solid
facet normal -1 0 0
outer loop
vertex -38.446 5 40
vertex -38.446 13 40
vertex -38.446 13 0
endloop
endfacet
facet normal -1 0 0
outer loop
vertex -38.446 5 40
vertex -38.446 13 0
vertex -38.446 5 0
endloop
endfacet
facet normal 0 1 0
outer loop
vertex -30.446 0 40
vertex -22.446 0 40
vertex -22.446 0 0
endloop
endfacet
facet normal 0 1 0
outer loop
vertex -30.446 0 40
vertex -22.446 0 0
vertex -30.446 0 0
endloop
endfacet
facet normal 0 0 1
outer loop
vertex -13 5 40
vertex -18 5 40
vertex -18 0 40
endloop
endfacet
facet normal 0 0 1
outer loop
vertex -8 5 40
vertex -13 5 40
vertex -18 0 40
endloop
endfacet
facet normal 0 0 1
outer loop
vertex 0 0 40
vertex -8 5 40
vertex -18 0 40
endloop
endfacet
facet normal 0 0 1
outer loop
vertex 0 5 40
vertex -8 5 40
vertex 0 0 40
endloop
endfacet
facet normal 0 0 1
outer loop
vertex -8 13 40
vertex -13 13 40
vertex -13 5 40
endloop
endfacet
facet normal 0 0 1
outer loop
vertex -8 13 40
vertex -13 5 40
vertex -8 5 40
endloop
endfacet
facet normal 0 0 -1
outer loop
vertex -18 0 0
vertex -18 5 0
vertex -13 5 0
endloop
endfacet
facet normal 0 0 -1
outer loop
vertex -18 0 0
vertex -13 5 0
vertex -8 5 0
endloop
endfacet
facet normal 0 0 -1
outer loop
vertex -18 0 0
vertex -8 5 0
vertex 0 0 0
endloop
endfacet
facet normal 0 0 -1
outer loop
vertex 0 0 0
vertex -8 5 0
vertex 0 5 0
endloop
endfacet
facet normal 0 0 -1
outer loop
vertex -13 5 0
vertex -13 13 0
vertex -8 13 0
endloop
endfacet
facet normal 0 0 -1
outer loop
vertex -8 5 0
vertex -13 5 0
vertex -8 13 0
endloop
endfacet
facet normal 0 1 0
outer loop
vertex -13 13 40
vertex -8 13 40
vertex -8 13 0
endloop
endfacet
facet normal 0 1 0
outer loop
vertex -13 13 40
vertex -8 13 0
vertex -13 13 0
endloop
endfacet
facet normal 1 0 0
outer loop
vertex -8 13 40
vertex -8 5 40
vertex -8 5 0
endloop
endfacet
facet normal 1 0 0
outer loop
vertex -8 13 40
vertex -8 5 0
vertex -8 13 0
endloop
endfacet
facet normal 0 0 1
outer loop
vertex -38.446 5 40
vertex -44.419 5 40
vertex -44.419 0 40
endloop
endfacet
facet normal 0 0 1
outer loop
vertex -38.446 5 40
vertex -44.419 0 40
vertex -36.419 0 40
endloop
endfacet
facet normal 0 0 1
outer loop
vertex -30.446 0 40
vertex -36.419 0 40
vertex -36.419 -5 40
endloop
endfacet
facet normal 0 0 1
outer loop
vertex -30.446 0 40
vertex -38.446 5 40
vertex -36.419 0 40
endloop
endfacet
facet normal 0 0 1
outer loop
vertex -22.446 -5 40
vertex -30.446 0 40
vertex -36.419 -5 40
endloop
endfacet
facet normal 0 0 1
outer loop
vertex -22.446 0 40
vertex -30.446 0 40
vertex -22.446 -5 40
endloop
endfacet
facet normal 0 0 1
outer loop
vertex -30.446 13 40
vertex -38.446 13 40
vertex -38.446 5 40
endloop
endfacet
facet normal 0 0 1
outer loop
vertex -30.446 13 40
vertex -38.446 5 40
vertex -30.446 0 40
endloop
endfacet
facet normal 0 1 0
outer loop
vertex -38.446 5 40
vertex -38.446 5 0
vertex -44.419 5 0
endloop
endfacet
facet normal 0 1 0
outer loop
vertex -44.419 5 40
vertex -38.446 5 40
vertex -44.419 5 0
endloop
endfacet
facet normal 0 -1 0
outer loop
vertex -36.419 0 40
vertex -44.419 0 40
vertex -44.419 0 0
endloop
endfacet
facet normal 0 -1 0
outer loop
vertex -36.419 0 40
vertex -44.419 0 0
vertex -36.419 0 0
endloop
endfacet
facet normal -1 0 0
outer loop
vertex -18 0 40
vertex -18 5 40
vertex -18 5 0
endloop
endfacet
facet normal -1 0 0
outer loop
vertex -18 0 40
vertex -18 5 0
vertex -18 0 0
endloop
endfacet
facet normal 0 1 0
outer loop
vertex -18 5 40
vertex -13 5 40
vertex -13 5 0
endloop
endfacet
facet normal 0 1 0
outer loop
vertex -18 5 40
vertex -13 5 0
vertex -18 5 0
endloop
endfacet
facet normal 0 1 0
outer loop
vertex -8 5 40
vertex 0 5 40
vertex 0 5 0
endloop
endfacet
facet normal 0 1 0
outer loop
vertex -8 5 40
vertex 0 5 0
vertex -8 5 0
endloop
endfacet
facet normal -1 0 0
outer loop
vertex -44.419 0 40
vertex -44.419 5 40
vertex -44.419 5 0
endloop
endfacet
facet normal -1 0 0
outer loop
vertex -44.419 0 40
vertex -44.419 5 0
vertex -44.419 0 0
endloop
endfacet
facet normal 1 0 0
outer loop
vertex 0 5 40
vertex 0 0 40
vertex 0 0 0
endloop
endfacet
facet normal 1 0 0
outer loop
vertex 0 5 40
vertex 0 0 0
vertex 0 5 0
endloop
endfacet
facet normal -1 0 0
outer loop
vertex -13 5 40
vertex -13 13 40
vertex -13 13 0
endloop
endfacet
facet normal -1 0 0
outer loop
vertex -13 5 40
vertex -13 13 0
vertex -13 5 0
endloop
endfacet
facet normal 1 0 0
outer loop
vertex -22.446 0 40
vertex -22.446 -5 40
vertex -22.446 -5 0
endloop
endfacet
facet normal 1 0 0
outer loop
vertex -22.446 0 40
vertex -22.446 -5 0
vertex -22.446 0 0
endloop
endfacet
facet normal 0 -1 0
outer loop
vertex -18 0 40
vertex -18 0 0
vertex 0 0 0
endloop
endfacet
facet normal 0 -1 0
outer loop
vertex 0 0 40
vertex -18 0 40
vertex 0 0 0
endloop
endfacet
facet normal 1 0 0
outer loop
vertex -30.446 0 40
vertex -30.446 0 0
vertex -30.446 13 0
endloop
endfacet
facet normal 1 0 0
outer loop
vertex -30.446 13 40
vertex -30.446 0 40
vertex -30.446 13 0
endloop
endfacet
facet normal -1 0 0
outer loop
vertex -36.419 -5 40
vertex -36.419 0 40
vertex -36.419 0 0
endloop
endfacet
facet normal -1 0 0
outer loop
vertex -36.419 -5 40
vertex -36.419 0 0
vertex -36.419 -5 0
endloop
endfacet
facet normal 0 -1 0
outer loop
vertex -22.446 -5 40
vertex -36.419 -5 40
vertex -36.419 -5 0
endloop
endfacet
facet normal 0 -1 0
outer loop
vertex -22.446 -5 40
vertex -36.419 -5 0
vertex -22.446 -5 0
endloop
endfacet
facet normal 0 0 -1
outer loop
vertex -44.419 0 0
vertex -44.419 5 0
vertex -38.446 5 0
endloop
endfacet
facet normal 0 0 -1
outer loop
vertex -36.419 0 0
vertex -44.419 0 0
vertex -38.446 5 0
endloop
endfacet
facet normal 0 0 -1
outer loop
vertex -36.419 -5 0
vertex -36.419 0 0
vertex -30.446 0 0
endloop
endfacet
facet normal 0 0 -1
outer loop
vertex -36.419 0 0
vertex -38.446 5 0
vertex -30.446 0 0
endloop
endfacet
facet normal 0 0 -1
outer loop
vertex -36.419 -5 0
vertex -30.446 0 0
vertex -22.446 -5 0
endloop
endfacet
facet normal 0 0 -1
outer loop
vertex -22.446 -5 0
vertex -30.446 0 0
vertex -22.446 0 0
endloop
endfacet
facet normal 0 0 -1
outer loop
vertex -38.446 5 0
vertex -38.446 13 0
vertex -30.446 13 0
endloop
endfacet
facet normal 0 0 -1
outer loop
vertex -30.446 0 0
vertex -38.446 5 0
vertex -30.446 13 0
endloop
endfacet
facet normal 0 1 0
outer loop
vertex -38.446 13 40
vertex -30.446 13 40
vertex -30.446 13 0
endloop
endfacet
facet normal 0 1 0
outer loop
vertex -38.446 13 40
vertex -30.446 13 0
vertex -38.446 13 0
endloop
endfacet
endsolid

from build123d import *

# Parameters (mm, degrees)
F1_DEPTH = 40


with BuildPart() as f1:
    # F0 (on Top) → F1 (new body)
    with BuildSketch(Plane.XY):
        Polygon((-18, 0), (0, 0), (0, 5), (-8, 5), (-8, 13), (-13, 13), (-13, 5), (-18, 5), align=None)
        Polygon((-22.445577, -5), (-22.445577, 0), (-30.445577, 0), (-30.445577, 13), (-38.445577, 13), (-38.445577, 5), (-44.418678, 5), (-44.418678, 0), (-36.418678, 0), (-36.418678, -5), align=None)
    extrude(amount=F1_DEPTH)


solid = f1.part
